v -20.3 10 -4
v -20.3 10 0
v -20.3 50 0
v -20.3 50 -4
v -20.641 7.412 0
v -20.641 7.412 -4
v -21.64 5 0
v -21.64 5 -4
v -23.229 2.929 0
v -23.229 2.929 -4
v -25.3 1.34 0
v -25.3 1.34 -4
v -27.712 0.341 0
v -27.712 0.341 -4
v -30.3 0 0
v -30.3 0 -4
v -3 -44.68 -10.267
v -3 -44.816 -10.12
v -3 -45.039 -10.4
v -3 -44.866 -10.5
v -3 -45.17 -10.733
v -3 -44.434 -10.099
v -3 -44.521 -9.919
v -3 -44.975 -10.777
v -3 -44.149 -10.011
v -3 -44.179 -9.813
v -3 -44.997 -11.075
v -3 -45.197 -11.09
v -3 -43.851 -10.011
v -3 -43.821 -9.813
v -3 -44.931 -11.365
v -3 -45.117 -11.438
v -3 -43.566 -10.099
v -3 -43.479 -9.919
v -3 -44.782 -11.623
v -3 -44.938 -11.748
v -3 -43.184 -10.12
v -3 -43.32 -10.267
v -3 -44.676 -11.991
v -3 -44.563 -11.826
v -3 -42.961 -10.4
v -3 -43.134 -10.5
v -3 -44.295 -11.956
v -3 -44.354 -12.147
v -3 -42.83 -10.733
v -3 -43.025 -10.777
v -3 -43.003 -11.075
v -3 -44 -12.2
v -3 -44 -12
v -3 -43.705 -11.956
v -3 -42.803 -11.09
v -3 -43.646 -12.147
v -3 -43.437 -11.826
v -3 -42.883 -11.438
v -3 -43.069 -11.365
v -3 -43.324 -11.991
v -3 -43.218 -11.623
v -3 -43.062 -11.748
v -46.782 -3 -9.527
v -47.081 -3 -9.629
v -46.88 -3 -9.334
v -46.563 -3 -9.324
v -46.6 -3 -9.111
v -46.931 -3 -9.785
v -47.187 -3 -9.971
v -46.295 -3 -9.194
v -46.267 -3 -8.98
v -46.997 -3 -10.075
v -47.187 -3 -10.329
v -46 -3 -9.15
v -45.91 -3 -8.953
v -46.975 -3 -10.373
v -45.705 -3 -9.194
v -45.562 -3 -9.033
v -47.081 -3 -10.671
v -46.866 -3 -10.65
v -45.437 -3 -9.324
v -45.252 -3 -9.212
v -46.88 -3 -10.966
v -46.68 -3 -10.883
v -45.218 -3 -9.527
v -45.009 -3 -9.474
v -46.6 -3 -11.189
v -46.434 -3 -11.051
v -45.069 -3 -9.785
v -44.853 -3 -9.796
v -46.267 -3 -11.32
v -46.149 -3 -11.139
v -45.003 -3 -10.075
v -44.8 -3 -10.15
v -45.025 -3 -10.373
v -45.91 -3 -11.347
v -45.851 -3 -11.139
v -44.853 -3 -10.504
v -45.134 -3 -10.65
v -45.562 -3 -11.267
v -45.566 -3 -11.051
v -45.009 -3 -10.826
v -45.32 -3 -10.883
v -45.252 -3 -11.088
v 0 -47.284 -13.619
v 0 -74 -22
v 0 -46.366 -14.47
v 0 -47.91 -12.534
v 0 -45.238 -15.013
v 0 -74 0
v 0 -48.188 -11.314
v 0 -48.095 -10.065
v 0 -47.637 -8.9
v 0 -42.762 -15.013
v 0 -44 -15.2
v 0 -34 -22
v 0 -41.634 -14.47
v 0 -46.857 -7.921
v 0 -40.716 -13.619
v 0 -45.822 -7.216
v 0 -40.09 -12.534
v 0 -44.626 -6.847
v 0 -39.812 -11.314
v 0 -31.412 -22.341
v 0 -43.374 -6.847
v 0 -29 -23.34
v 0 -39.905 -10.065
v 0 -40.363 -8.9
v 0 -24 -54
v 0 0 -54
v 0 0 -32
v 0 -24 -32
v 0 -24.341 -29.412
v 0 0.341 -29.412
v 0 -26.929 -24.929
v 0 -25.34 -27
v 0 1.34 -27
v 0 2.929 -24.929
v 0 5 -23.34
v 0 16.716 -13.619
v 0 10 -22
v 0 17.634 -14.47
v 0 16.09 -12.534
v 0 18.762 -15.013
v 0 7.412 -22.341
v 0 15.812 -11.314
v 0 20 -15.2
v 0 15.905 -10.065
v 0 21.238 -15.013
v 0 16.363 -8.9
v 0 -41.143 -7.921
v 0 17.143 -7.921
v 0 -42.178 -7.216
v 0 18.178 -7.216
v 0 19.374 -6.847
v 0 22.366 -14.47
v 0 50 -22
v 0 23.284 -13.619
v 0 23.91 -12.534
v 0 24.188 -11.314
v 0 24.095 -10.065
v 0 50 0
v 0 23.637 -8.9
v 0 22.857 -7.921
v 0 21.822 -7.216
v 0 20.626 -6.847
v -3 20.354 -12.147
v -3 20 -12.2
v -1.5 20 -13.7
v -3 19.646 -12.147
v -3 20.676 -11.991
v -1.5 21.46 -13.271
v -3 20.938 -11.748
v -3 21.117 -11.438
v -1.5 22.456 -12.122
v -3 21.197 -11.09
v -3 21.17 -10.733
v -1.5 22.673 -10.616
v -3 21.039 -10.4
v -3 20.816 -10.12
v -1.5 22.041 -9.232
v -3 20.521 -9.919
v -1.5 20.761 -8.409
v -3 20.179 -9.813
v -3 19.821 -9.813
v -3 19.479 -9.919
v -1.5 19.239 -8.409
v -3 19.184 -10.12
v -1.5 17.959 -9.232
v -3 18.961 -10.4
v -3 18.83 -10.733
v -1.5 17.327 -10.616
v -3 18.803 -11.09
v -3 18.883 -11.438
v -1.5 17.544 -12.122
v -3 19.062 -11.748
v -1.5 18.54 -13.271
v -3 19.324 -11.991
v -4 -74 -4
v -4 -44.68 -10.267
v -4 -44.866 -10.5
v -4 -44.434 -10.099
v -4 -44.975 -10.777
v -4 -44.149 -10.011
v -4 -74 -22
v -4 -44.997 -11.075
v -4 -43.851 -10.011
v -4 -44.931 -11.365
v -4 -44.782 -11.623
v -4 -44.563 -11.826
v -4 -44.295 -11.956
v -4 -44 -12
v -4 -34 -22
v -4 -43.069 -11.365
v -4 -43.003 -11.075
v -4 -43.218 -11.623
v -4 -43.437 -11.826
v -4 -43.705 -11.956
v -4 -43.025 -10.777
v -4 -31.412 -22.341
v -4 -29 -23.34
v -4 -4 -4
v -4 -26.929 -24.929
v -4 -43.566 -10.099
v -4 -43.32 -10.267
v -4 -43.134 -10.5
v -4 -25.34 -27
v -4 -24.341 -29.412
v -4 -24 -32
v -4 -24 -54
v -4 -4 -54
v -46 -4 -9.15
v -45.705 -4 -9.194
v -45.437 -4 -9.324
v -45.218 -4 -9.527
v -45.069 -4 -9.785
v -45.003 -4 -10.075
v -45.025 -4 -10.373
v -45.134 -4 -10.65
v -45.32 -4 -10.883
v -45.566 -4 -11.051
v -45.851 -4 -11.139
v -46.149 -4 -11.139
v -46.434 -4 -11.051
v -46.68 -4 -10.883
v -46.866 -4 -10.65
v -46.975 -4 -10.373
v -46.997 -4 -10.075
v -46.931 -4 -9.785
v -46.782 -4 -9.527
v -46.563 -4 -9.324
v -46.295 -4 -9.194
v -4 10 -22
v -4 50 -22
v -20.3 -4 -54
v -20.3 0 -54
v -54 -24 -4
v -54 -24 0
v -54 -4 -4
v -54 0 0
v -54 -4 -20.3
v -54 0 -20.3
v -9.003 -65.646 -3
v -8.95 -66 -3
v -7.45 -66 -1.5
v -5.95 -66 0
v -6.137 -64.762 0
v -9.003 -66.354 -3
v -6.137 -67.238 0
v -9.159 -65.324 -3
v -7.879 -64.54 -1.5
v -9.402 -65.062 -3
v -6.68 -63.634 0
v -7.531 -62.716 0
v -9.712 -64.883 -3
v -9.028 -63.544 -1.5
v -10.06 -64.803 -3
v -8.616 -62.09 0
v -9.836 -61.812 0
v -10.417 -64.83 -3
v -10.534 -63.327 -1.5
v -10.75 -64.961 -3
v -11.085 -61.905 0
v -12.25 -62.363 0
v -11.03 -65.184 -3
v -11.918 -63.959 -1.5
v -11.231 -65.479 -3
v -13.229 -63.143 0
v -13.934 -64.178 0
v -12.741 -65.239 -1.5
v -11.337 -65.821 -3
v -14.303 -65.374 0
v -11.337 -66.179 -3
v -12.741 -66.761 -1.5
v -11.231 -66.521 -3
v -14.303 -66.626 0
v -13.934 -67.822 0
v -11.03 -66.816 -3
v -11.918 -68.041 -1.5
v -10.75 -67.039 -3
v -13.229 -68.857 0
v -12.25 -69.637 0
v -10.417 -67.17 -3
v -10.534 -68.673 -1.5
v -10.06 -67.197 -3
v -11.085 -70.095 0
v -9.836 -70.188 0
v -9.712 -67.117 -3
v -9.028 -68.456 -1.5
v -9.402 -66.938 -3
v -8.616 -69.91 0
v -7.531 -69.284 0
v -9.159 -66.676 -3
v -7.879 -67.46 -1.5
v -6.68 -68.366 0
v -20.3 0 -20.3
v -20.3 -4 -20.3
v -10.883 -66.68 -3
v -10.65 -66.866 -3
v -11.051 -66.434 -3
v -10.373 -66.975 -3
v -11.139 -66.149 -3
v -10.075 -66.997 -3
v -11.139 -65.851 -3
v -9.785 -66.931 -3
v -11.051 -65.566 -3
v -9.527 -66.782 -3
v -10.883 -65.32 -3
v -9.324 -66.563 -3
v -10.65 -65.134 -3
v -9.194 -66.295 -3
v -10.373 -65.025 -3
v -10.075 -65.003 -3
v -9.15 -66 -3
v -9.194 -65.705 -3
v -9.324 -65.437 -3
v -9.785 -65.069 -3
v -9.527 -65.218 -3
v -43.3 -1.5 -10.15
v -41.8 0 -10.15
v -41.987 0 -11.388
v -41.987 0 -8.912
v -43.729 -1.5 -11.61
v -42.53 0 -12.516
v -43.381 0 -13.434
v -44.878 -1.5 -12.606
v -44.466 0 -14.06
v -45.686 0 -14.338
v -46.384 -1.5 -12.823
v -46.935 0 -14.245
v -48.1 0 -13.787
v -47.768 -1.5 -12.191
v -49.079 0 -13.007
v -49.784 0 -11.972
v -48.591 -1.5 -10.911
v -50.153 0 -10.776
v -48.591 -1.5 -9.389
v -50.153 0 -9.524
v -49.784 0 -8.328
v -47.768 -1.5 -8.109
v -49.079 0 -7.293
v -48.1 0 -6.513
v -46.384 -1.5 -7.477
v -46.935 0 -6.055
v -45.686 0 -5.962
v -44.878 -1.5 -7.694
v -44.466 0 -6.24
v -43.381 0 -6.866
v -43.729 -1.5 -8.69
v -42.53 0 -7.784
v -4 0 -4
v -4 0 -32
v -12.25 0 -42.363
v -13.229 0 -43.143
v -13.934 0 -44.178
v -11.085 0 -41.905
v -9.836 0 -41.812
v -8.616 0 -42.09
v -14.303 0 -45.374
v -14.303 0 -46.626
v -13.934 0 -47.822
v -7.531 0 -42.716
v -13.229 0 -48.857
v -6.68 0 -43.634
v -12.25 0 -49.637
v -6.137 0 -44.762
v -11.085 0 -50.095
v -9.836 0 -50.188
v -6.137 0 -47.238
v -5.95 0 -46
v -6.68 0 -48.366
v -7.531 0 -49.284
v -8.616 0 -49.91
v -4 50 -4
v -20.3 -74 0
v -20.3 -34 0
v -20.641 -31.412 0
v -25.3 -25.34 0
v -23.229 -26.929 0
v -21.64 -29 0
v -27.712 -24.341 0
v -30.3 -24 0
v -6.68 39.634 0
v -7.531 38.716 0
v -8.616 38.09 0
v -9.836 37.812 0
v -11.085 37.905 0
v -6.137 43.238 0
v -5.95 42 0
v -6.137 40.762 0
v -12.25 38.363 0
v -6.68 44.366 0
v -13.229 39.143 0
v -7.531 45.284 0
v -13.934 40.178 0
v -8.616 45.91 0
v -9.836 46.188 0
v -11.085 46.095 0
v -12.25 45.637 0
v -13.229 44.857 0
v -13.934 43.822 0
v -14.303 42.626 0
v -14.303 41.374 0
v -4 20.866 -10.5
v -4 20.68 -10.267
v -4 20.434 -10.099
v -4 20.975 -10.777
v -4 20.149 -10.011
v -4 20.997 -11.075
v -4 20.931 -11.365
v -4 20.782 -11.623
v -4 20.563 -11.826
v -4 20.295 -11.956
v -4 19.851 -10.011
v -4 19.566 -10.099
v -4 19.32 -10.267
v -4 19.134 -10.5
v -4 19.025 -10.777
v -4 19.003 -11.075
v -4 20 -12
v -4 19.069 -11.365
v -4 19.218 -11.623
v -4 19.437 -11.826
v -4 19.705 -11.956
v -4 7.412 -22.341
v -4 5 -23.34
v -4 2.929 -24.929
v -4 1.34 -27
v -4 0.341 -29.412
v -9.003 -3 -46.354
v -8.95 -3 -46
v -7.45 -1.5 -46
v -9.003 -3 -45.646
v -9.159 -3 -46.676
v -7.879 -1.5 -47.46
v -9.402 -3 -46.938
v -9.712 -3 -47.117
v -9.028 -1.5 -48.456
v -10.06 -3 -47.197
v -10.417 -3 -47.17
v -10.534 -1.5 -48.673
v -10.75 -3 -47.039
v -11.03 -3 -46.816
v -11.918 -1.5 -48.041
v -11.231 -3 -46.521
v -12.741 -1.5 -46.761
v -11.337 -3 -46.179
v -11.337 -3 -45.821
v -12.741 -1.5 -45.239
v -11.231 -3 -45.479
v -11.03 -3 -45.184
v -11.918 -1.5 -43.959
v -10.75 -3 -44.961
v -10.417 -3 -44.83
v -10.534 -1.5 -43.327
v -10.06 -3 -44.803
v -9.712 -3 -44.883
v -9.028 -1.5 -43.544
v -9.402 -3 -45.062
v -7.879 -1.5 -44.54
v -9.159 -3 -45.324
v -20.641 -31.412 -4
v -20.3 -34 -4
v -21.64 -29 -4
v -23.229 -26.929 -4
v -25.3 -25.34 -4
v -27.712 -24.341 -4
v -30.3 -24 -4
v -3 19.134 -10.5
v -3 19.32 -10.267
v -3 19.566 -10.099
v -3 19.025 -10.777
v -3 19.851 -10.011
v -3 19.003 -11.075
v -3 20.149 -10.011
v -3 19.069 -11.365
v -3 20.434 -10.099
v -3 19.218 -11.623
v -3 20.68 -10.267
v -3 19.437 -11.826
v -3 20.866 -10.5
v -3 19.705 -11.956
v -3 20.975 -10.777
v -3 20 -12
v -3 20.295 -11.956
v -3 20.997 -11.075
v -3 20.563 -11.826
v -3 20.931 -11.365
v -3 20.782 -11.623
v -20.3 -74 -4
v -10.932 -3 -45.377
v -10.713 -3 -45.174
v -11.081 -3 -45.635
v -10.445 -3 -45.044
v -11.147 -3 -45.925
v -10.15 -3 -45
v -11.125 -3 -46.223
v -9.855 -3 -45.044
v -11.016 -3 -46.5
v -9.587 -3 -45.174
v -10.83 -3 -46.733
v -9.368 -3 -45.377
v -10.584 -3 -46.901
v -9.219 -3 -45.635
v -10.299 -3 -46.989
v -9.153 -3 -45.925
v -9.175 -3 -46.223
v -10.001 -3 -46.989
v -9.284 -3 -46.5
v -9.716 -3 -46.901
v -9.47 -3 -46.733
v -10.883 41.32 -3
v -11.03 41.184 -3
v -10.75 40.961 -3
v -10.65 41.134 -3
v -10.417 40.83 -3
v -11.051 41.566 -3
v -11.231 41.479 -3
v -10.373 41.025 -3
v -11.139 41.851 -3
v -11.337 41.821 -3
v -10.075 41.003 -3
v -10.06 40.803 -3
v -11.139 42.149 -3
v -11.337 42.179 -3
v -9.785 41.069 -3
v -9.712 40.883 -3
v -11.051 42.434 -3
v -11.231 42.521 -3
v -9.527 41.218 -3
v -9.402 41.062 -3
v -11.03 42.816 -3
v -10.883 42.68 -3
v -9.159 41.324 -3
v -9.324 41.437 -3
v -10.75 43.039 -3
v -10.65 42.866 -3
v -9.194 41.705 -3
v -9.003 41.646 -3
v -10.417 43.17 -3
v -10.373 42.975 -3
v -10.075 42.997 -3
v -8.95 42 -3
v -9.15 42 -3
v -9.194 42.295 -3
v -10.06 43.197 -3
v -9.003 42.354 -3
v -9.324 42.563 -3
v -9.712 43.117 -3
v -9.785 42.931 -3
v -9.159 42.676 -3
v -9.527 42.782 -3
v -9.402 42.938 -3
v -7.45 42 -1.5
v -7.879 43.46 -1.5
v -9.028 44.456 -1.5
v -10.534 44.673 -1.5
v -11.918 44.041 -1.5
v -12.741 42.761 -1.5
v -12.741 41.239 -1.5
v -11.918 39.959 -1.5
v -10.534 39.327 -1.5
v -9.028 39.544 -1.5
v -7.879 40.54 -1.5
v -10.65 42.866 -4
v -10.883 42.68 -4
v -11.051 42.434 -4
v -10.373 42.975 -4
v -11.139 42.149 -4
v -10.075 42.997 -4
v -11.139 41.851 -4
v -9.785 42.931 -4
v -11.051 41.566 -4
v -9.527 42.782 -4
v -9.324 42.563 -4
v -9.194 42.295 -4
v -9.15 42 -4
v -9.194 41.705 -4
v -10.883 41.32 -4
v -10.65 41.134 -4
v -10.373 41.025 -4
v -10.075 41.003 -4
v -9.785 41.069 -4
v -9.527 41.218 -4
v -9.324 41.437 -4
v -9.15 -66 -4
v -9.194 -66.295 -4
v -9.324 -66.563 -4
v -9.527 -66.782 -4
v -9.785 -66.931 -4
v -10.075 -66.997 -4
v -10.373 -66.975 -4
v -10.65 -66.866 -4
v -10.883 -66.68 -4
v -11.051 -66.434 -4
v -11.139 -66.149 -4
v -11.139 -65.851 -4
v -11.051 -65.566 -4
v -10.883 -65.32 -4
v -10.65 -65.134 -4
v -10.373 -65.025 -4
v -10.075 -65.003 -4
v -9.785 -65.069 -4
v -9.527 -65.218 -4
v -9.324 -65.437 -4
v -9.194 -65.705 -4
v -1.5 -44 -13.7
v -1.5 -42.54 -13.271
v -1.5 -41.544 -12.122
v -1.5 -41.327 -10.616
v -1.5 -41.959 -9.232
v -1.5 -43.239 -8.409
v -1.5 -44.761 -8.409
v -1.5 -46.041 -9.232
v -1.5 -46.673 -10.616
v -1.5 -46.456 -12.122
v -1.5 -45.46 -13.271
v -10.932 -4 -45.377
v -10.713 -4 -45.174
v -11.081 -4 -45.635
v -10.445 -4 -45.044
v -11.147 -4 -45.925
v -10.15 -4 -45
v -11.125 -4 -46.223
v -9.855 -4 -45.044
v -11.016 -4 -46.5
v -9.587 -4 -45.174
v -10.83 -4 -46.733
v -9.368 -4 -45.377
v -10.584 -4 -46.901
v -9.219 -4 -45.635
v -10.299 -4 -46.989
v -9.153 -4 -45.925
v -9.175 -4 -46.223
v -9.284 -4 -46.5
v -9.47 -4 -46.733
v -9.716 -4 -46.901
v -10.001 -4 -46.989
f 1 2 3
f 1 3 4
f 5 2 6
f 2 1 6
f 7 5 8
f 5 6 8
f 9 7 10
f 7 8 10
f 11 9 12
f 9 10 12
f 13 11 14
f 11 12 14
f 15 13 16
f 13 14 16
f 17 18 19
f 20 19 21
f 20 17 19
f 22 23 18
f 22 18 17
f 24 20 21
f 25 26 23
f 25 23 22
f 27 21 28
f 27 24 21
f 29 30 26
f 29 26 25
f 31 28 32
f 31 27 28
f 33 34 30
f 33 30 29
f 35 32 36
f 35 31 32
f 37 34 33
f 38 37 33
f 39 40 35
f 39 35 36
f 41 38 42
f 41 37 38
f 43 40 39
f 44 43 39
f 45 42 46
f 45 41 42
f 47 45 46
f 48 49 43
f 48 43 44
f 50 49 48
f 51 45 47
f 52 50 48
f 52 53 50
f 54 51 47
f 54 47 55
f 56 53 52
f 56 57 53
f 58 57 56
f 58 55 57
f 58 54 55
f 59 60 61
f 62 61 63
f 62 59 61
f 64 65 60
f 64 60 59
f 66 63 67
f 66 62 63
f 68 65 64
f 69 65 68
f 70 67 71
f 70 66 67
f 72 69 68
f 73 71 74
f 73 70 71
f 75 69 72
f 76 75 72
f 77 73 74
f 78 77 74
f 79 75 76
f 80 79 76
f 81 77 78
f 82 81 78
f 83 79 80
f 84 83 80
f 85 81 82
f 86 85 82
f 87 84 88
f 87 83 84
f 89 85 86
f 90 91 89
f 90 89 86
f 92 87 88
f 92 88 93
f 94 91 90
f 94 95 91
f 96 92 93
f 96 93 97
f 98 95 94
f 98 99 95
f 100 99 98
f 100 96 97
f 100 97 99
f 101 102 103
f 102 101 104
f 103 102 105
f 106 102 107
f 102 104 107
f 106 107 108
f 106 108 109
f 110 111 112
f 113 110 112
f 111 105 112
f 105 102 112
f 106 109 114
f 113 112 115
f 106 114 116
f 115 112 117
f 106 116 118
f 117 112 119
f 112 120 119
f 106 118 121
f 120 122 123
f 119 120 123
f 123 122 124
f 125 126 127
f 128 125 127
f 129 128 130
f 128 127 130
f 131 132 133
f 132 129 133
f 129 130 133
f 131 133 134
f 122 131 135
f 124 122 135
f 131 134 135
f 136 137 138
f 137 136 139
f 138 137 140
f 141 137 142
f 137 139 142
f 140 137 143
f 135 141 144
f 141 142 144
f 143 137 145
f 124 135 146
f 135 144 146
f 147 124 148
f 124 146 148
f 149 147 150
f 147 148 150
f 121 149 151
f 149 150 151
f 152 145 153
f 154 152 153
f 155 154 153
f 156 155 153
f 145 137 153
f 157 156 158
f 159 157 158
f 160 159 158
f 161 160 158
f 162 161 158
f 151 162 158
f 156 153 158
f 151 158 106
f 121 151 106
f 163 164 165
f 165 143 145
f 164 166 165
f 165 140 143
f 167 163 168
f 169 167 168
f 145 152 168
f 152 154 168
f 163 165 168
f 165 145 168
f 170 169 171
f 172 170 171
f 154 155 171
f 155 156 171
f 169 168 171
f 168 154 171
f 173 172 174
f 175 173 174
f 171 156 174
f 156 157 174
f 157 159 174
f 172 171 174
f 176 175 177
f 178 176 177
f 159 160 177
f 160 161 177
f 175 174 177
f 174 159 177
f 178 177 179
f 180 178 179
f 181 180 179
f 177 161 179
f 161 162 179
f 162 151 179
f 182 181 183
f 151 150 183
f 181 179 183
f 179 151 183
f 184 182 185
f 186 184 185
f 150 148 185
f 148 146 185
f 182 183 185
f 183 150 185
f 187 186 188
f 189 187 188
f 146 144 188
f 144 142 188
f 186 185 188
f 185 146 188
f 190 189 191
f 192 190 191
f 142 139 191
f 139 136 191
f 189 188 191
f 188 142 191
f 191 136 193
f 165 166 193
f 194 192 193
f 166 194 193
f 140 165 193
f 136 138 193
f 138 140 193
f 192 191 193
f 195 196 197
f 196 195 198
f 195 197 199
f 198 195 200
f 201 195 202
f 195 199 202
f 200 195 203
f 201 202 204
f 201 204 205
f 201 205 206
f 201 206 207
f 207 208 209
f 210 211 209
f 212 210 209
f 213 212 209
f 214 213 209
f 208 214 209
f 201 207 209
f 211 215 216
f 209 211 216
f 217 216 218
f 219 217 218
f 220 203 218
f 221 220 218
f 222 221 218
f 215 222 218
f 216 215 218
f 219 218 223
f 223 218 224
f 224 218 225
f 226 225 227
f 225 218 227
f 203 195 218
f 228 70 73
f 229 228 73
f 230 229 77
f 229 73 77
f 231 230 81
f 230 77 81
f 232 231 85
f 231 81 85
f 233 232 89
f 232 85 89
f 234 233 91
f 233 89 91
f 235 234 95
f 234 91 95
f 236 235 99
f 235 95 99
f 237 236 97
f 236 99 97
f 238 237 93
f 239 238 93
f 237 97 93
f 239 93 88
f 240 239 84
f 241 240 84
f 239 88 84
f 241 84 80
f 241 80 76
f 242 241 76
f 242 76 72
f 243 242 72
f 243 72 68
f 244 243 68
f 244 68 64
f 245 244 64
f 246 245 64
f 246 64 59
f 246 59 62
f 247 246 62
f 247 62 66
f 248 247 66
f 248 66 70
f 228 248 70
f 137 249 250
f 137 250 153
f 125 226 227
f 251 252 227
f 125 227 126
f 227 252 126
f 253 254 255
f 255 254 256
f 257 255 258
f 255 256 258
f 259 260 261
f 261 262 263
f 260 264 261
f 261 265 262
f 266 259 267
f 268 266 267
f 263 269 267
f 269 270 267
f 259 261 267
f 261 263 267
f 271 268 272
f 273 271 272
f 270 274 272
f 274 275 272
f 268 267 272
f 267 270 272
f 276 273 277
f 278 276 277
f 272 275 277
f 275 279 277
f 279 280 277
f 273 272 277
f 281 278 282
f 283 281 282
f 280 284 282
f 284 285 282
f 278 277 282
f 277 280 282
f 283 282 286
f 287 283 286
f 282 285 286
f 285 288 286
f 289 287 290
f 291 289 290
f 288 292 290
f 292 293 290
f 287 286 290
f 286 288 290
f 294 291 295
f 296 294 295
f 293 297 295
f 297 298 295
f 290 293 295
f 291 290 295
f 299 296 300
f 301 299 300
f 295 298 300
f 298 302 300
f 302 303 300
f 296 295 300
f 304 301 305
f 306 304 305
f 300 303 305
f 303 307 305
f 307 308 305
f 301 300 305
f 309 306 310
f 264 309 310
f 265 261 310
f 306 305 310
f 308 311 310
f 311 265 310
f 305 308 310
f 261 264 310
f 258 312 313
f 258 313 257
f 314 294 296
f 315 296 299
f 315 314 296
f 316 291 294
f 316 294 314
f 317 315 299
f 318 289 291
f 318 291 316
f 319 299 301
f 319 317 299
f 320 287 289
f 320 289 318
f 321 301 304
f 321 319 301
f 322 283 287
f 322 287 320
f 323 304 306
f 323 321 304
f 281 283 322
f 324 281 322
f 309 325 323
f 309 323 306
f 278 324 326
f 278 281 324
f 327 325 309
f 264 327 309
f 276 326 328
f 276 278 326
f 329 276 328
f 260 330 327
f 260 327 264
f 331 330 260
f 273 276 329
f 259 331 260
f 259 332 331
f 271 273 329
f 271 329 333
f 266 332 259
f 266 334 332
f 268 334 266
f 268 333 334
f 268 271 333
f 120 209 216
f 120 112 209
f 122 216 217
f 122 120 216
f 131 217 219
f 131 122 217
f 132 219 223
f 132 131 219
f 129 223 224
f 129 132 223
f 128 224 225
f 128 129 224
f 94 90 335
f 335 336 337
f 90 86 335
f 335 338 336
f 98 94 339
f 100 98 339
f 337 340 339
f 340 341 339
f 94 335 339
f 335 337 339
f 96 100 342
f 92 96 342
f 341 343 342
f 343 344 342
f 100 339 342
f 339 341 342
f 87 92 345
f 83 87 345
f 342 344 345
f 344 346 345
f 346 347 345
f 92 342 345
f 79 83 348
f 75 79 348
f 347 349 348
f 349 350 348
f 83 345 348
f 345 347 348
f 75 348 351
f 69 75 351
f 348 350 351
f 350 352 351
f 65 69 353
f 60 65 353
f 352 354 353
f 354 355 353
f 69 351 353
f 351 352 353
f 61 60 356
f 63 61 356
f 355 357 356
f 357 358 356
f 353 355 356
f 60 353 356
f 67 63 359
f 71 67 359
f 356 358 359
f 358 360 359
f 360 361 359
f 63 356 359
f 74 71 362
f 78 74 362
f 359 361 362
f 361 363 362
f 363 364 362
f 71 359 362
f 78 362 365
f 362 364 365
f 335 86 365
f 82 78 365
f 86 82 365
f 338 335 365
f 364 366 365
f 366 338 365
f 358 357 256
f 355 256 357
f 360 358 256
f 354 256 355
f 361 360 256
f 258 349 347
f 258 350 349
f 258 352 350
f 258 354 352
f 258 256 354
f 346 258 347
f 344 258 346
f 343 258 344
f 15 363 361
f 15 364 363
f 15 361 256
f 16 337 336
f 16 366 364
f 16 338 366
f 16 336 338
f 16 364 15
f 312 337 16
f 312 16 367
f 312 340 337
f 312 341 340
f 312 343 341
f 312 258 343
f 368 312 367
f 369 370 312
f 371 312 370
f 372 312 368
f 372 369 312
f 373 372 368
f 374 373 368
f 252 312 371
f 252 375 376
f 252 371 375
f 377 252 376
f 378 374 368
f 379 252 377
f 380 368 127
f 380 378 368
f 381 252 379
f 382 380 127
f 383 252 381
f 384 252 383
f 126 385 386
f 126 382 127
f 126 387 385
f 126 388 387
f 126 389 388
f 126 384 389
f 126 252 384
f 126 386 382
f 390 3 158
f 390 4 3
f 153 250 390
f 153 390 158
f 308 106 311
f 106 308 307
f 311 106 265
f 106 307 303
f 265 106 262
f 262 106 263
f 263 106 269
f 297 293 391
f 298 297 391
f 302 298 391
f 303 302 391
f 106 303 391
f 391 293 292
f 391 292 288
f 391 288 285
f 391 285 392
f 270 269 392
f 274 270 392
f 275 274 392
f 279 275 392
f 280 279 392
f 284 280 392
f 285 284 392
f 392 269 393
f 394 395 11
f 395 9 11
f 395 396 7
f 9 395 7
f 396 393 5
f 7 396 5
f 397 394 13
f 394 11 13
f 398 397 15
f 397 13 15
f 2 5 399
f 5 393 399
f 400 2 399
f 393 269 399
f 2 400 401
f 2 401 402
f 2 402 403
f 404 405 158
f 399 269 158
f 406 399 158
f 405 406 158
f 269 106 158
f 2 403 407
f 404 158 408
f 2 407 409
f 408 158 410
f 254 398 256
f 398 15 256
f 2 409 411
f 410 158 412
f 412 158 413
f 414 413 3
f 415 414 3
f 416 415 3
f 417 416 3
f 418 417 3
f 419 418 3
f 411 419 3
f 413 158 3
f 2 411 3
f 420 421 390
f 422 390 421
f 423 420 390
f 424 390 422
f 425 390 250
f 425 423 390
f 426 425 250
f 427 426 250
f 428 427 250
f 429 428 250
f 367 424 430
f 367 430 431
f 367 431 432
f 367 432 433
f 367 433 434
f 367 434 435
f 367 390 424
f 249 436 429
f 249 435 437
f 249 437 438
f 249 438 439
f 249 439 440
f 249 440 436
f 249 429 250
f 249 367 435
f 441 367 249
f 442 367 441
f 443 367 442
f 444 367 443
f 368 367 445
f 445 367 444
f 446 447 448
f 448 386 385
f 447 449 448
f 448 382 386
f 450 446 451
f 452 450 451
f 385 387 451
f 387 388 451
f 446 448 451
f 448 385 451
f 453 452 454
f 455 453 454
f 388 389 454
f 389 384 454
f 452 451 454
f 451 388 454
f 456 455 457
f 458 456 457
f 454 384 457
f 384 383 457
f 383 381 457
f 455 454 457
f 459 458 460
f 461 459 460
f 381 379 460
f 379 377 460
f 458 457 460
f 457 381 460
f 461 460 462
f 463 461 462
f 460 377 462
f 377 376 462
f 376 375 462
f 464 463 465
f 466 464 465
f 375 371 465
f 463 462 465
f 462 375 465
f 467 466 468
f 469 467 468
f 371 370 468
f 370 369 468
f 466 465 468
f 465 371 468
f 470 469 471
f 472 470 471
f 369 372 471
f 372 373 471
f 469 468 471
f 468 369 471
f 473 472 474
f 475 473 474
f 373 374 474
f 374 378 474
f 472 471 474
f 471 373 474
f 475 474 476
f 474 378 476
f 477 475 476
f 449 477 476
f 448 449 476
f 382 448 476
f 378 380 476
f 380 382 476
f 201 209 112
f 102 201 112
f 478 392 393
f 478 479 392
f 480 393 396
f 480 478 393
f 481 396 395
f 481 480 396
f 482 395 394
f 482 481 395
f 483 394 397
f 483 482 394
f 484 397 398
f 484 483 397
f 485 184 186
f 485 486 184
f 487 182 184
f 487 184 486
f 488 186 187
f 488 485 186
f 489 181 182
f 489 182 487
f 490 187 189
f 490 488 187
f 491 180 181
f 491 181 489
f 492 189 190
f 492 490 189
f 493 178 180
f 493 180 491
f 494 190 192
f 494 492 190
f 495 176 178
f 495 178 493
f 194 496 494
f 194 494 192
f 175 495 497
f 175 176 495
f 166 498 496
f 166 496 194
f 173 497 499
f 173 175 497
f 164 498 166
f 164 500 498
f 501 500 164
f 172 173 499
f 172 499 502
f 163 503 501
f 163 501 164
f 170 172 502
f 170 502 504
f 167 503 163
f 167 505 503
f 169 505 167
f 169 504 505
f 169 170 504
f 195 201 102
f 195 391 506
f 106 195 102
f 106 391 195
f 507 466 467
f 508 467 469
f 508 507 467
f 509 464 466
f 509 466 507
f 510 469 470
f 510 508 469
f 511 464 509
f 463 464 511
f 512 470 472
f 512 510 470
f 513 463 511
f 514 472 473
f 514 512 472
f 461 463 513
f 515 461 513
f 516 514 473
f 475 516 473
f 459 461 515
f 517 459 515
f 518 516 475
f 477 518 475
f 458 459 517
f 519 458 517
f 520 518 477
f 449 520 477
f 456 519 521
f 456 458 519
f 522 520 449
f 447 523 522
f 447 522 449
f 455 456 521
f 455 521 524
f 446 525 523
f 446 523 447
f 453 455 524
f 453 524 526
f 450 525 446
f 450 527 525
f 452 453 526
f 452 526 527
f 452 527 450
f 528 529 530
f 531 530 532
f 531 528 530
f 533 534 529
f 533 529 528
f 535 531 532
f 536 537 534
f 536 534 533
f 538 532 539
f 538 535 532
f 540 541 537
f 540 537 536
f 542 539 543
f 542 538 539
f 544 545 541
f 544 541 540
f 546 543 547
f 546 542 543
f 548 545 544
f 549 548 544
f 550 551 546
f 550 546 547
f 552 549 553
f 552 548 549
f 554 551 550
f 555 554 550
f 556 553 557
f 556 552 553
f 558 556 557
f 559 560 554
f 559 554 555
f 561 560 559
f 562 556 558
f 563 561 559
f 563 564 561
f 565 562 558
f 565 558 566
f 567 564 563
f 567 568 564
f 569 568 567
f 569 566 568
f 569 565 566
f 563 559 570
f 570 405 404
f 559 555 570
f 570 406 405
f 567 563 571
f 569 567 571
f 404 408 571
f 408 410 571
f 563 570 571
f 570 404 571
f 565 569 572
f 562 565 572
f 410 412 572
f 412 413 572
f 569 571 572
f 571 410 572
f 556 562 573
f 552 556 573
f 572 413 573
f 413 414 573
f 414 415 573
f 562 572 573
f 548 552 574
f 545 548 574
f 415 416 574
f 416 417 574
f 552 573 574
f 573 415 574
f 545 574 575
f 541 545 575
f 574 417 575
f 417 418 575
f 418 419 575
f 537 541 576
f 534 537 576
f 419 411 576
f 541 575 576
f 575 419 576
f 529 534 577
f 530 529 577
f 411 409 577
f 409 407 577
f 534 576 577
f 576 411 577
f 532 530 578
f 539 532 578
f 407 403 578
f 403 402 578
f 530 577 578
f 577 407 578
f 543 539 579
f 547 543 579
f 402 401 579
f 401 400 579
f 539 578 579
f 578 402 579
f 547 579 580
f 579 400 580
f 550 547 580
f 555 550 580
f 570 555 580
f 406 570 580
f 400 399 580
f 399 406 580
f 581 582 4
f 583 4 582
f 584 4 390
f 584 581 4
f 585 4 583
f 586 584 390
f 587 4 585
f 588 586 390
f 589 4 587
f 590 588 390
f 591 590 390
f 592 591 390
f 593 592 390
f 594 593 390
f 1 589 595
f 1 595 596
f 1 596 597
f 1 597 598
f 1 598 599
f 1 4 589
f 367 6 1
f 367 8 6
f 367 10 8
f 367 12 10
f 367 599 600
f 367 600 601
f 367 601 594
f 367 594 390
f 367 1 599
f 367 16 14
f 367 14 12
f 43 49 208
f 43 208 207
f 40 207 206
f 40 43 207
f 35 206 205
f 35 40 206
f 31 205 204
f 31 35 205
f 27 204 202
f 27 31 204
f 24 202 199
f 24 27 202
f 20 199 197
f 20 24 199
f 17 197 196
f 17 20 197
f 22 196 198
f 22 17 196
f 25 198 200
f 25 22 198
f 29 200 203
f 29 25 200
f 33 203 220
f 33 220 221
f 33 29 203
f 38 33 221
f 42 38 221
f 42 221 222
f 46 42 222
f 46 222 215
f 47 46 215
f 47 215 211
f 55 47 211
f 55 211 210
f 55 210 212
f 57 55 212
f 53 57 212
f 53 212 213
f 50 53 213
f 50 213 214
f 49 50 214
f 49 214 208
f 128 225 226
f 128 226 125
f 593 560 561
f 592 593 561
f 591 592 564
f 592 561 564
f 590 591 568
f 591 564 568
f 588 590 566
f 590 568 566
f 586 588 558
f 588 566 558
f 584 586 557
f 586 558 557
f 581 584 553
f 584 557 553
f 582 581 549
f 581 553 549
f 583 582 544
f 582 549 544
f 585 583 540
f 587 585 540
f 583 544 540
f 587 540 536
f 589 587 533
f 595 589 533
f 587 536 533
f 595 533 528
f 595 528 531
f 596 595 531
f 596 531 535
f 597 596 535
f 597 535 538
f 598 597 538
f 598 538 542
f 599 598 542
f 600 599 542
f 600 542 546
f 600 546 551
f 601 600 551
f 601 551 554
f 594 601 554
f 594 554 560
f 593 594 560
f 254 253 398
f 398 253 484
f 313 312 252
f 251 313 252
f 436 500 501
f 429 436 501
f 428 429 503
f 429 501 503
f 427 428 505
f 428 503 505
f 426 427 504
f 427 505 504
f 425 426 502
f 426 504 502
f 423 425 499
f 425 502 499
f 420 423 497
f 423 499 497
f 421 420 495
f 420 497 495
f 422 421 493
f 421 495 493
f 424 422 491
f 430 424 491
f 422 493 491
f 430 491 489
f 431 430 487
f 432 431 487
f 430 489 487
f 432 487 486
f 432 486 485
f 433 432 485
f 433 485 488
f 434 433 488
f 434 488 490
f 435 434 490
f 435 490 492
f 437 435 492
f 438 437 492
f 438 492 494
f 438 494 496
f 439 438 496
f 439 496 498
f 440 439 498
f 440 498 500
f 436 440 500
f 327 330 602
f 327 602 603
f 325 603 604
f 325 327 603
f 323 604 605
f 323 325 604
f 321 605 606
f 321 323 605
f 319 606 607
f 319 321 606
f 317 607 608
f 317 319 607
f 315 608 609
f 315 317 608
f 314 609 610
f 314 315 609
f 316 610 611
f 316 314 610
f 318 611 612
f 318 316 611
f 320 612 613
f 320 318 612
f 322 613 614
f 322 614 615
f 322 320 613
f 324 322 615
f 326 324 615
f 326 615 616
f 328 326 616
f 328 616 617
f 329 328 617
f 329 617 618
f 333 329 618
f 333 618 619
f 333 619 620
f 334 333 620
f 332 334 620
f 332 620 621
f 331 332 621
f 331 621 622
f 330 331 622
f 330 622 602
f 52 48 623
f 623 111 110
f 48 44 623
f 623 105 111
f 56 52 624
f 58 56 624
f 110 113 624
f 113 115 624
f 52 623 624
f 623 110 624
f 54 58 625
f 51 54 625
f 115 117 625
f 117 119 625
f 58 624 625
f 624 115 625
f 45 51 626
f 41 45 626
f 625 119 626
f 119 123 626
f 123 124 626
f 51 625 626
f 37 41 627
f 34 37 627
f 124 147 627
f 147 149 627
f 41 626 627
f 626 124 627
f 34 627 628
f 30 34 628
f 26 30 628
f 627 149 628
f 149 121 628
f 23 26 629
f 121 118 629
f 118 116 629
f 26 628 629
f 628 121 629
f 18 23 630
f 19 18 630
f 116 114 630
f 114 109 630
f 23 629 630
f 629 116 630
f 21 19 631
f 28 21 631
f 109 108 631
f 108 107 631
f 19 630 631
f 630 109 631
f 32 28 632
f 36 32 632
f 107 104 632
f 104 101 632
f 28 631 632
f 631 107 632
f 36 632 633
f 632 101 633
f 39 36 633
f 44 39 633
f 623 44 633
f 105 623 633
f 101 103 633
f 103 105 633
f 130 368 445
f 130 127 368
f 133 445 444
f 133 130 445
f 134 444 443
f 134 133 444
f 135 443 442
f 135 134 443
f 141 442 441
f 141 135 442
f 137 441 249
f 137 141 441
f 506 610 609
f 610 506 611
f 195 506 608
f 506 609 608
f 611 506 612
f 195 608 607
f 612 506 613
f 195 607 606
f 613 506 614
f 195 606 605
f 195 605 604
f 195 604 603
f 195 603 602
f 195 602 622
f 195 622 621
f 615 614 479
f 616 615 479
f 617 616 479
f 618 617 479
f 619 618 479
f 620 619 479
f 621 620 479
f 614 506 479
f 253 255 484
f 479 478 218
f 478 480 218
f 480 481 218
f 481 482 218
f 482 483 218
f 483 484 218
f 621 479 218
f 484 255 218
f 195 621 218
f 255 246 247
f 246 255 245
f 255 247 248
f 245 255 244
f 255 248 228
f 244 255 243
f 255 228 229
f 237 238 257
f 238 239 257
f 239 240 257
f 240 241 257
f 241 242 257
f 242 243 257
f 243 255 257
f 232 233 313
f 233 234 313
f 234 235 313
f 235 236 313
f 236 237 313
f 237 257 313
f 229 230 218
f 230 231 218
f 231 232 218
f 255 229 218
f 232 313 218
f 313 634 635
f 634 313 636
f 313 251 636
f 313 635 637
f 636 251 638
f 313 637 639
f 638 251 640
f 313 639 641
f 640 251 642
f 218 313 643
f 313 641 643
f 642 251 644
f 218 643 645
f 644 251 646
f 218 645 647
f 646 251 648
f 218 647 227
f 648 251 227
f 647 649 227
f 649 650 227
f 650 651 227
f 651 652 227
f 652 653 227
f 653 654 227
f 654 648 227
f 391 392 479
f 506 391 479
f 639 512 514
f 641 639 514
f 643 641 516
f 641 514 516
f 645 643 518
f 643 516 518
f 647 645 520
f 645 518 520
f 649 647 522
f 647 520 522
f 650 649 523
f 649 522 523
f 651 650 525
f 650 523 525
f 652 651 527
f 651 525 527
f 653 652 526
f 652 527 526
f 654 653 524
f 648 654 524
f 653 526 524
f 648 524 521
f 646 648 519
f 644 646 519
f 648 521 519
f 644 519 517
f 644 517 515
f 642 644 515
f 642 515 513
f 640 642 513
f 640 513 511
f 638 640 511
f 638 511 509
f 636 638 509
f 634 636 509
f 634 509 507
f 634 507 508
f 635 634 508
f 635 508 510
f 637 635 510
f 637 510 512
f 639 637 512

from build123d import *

# Parameters (mm, degrees)
SKETCH1_W                    = 33.7
SKETCH1_H                    = 20.3
SKETCH1_W_2                  = 20.3
SKETCH1_H_2                  = 33.7
BOSS_EXTRUDE1_DEPTH          = 24
SHELL1_T                     = -4
SKETCH2_R                    = 1
CUT_EXTRUDE1_DEPTH           = 24
SKETCH3_R                    = 4.2
CUT_EXTRUDE2_DEPTH           = 3
CUT_EXTRUDE2_DRAFT           = -45
CUT_EXTRUDE2_PROFILE_2_DEPTH = 3
CUT_EXTRUDE2_PROFILE_2_DRAFT = -45
SKETCH4_W                    = 20.3
SKETCH4_H                    = 22
BOSS_EXTRUDE2_DEPTH          = 50
SHELL2_T                     = -4
CUT_EXTRUDE3_REACH           = 93.28
SKETCH5_R                    = 1
SKETCH6_R                    = 4.2
CUT_EXTRUDE4_DEPTH           = 3
CUT_EXTRUDE4_DRAFT           = -45
CUT_EXTRUDE5_REACH           = 93.28
SKETCH7_R                    = 1
SKETCH8_R                    = 4.2
CUT_EXTRUDE6_DEPTH           = 3
CUT_EXTRUDE6_DRAFT           = -45
FILLET1_R                    = 10
BOSS_EXTRUDE3_DEPTH          = 50
MIRROR4_COPY_1_SKETCH_R      = 4.2
MIRROR4_COPY_1_DEPTH         = 3
MIRROR4_COPY_1_DRAFT         = -45
MIRROR4_COPY_2_SKETCH_R      = 4.2
MIRROR4_COPY_2_DEPTH         = 3
MIRROR4_COPY_2_DRAFT         = -45
FILLET2_R                    = 10


with BuildPart() as part:
    # Sketch1 → Boss-Extrude1 (new body)
    with BuildSketch(Plane(origin=(0, 0, 0), x_dir=(1, 0, 0), z_dir=(0, 1, 0))):
        with Locations((-37.15, 10.15)):
            Rectangle(SKETCH1_W, SKETCH1_H)
        with Locations((-10.15, 10.15)):
            Rectangle(SKETCH1_W_2, SKETCH1_H)
        with Locations((-10.15, 37.15)):
            Rectangle(SKETCH1_W_2, SKETCH1_H_2)
    extrude(amount=-BOSS_EXTRUDE1_DEPTH)

    # Shell1
    shell1_openings = [part.faces().sort_by_distance(p)[0] for p in [
        (-53.236324676, -24, -10.15),
        (-54, -12, -10.15),
        (-37.15, -12, -20.3),
        (-20.3, -12, -37.15),
        (-10.15, -12, -54),
    ]]
    offset(amount=SHELL1_T, openings=shell1_openings, kind=Kind.INTERSECTION)

    # Sketch2 → Cut-Extrude1 (cut)
    with BuildSketch(Plane(origin=(0, 0, 0), x_dir=(1, 0, 0), z_dir=(0, 1, 0))):
        with Locations(Location((-10.15, 46, 0), (0, 0, 270))):
            Circle(SKETCH2_R)
        with Locations(Location((-46, 10.15, 0), (0, 0, 270))):
            Circle(SKETCH2_R)
    extrude(amount=-CUT_EXTRUDE1_DEPTH, mode=Mode.SUBTRACT)


with BuildPart() as cut_extrude2_tool:
    # Sketch3 → Cut-Extrude2 (with draft: the straight prism first)
    with BuildSketch(Plane(origin=(0, 0, 0), x_dir=(1, 0, 0), z_dir=(0, 1, 0))):
        with Locations((-46, 10.15)):
            Circle(SKETCH3_R)
    extrude(amount=-CUT_EXTRUDE2_DEPTH)
    # Cut-Extrude2: the draft: its side faces are tilted about the plane it starts from
    cut_extrude2_sides = [cut_extrude2_tool.faces().sort_by_distance(p)[0] for p in [
        (-50.2, -1.5, -10.15),
    ]]
    draft(cut_extrude2_sides, Plane(origin=(0, 0, 0), x_dir=(1, 0, 0), z_dir=(0, 1, 0)), CUT_EXTRUDE2_DRAFT)


with BuildPart() as part_1:
    add(part.part)

    # Cut-Extrude2: cut by cut_extrude2_tool
    add(cut_extrude2_tool.part, mode=Mode.SUBTRACT)


with BuildPart() as cut_extrude2_profile_2_tool:
    # Sketch3 → Cut-Extrude2 profile 2 (with draft: the straight prism first)
    with BuildSketch(Plane(origin=(0, 0, 0), x_dir=(1, 0, 0), z_dir=(0, 1, 0))):
        with Locations((-10.15, 46)):
            Circle(SKETCH3_R)
    extrude(amount=-CUT_EXTRUDE2_PROFILE_2_DEPTH)
    # Cut-Extrude2 profile 2: the draft: its side faces are tilted about the plane it starts from
    cut_extrude2_profile_2_sides = [cut_extrude2_profile_2_tool.faces().sort_by_distance(p)[0] for p in [
        (-14.35, -1.5, -46),
    ]]
    draft(cut_extrude2_profile_2_sides, Plane(origin=(0, 0, 0), x_dir=(1, 0, 0), z_dir=(0, 1, 0)), CUT_EXTRUDE2_PROFILE_2_DRAFT)


with BuildPart() as part_2:
    add(part_1.part)

    # Cut-Extrude2 profile 2: cut by cut_extrude2_profile_2_tool
    add(cut_extrude2_profile_2_tool.part, mode=Mode.SUBTRACT)


with BuildPart() as body_2:
    # Sketch4 → Boss-Extrude2 (new body)
    with BuildSketch(Plane(origin=(0, 0, 0), x_dir=(1, 0, 0), z_dir=(0, 1, 0))):
        with Locations((-10.15, 11)):
            Rectangle(SKETCH4_W, SKETCH4_H)
    extrude(amount=BOSS_EXTRUDE2_DEPTH)

    # Shell2
    shell2_openings = [body_2.faces().sort_by_distance(p)[0] for p in [
        (-10.15, 50, -11),
        (-10.15, 0, -11),
        (-20.3, 25, -11),
        (-10.15, 25, -22),
    ]]
    offset(amount=SHELL2_T, openings=shell2_openings, kind=Kind.INTERSECTION)


with BuildPart() as part_3:
    add(part_2.part)

    # Combine1: union body 2
    add(body_2.part)

    # Sketch5 → Cut-Extrude3 (cut, up to next)
    with BuildSketch(Plane.XY, mode=Mode.PRIVATE) as cut_extrude3_sk1:
        with Locations((-10.15, 42)):
            Circle(SKETCH5_R)
    cut_extrude3_tool1 = extrude(cut_extrude3_sk1.sketch, amount=-CUT_EXTRUDE3_REACH, mode=Mode.PRIVATE) & part_3.part
    cut_extrude3 = cut_extrude3_tool1.solids().sort_by_distance((-10.15, 42, 0))[0]
    add(cut_extrude3, mode=Mode.SUBTRACT)


with BuildPart() as cut_extrude4_tool:
    # Sketch6 → Cut-Extrude4 (with draft: the straight prism first)
    with BuildSketch(Plane.XY):
        with Locations((-10.15, 42)):
            Circle(SKETCH6_R)
    extrude(amount=-CUT_EXTRUDE4_DEPTH)
    # Cut-Extrude4: the draft: its side faces are tilted about the plane it starts from
    cut_extrude4_sides = [cut_extrude4_tool.faces().sort_by_distance(p)[0] for p in [
        (-14.35, 42, -1.5),
    ]]
    draft(cut_extrude4_sides, Plane.XY, CUT_EXTRUDE4_DRAFT)


with BuildPart() as part_4:
    add(part_3.part)

    # Cut-Extrude4: cut by cut_extrude4_tool
    add(cut_extrude4_tool.part, mode=Mode.SUBTRACT)

    # Sketch7 → Cut-Extrude5 (cut, up to next)
    with BuildSketch(Plane(origin=(0, 0, 0), x_dir=(0, 0, -1), z_dir=(1, 0, 0)), mode=Mode.PRIVATE) as cut_extrude5_sk1:
        with Locations((11, 20)):
            Circle(SKETCH7_R)
    cut_extrude5_tool1 = extrude(cut_extrude5_sk1.sketch, amount=-CUT_EXTRUDE5_REACH, mode=Mode.PRIVATE) & part_4.part
    cut_extrude5 = cut_extrude5_tool1.solids().sort_by_distance((0, 20, -11))[0]
    add(cut_extrude5, mode=Mode.SUBTRACT)


with BuildPart() as cut_extrude6_tool:
    # Sketch8 → Cut-Extrude6 (with draft: the straight prism first)
    with BuildSketch(Plane(origin=(0, 0, 0), x_dir=(0, 0, -1), z_dir=(1, 0, 0))):
        with Locations((11, 20)):
            Circle(SKETCH8_R)
    extrude(amount=-CUT_EXTRUDE6_DEPTH)
    # Cut-Extrude6: the draft: its side faces are tilted about the plane it starts from
    cut_extrude6_sides = [cut_extrude6_tool.faces().sort_by_distance(p)[0] for p in [
        (-1.5, 20, -6.8),
    ]]
    draft(cut_extrude6_sides, Plane(origin=(0, 0, 0), x_dir=(0, 0, -1), z_dir=(1, 0, 0)), CUT_EXTRUDE6_DRAFT)


with BuildPart() as part_5:
    add(part_4.part)

    # Cut-Extrude6: cut by cut_extrude6_tool
    add(cut_extrude6_tool.part, mode=Mode.SUBTRACT)

    # Fillet1
    fillet1_edges = [part_5.edges().sort_by_distance(p)[0] for p in [
        (-2, 0, -22),
        (-20.3, 0, -2),
    ]]
    fillet(fillet1_edges, radius=FILLET1_R)

    # Sketch9 → Boss-Extrude3 (add)
    with BuildSketch(Plane.XZ.offset(24)):
        Polygon((-4, -4), (-4, -22), (0, -22), (0, 0), (-20.3, 0), (-20.3, -4), align=None)
    extrude(amount=BOSS_EXTRUDE3_DEPTH)

    # Mirror4: Cut-Extrude3, Cut-Extrude5 across plane
    add(cut_extrude3.mirror(Plane(origin=(0, -12, 0), x_dir=(0, 0, 1), z_dir=(0, -1, 0))), mode=Mode.SUBTRACT)
    add(cut_extrude5.mirror(Plane(origin=(0, -12, 0), x_dir=(0, 0, 1), z_dir=(0, -1, 0))), mode=Mode.SUBTRACT)


with BuildPart() as mirror4_copy_1_tool:
    # Mirror4 copy 1 sketch → Mirror4 copy 1 (with draft: the straight prism first)
    with BuildSketch(Plane(origin=(0, -24, 0), x_dir=(1, 0, 0), z_dir=(0, 0, 1))):
        with Locations((-10.15, -42)):
            Circle(MIRROR4_COPY_1_SKETCH_R)
    extrude(amount=-MIRROR4_COPY_1_DEPTH)
    # Mirror4 copy 1: the draft: its side faces are tilted about the plane it starts from
    mirror4_copy_1_sides = [mirror4_copy_1_tool.faces().sort_by_distance(p)[0] for p in [
        (-14.35, -66, -1.5),
    ]]
    draft(mirror4_copy_1_sides, Plane(origin=(0, -24, 0), x_dir=(1, 0, 0), z_dir=(0, 0, 1)), MIRROR4_COPY_1_DRAFT)


with BuildPart() as part_6:
    add(part_5.part)

    # Mirror4 copy 1: cut by mirror4_copy_1_tool
    add(mirror4_copy_1_tool.part, mode=Mode.SUBTRACT)


with BuildPart() as mirror4_copy_2_tool:
    # Mirror4 copy 2 sketch → Mirror4 copy 2 (with draft: the straight prism first)
    with BuildSketch(Plane(origin=(0, -24, 0), x_dir=(0, 0, -1), z_dir=(1, 0, 0))):
        with Locations((11, -20)):
            Circle(MIRROR4_COPY_2_SKETCH_R)
    extrude(amount=-MIRROR4_COPY_2_DEPTH)
    # Mirror4 copy 2: the draft: its side faces are tilted about the plane it starts from
    mirror4_copy_2_sides = [mirror4_copy_2_tool.faces().sort_by_distance(p)[0] for p in [
        (-1.5, -44, -6.8),
    ]]
    draft(mirror4_copy_2_sides, Plane(origin=(0, -24, 0), x_dir=(0, 0, -1), z_dir=(1, 0, 0)), MIRROR4_COPY_2_DRAFT)


with BuildPart() as part_7:
    add(part_6.part)

    # Mirror4 copy 2: cut by mirror4_copy_2_tool
    add(mirror4_copy_2_tool.part, mode=Mode.SUBTRACT)

    # Fillet2
    fillet2_edges = [part_7.edges().sort_by_distance(p)[0] for p in [
        (-2, -24, -22),
        (-20.3, -24, -2),
    ]]
    fillet(fillet2_edges, radius=FILLET2_R)


solid = part_7.part
